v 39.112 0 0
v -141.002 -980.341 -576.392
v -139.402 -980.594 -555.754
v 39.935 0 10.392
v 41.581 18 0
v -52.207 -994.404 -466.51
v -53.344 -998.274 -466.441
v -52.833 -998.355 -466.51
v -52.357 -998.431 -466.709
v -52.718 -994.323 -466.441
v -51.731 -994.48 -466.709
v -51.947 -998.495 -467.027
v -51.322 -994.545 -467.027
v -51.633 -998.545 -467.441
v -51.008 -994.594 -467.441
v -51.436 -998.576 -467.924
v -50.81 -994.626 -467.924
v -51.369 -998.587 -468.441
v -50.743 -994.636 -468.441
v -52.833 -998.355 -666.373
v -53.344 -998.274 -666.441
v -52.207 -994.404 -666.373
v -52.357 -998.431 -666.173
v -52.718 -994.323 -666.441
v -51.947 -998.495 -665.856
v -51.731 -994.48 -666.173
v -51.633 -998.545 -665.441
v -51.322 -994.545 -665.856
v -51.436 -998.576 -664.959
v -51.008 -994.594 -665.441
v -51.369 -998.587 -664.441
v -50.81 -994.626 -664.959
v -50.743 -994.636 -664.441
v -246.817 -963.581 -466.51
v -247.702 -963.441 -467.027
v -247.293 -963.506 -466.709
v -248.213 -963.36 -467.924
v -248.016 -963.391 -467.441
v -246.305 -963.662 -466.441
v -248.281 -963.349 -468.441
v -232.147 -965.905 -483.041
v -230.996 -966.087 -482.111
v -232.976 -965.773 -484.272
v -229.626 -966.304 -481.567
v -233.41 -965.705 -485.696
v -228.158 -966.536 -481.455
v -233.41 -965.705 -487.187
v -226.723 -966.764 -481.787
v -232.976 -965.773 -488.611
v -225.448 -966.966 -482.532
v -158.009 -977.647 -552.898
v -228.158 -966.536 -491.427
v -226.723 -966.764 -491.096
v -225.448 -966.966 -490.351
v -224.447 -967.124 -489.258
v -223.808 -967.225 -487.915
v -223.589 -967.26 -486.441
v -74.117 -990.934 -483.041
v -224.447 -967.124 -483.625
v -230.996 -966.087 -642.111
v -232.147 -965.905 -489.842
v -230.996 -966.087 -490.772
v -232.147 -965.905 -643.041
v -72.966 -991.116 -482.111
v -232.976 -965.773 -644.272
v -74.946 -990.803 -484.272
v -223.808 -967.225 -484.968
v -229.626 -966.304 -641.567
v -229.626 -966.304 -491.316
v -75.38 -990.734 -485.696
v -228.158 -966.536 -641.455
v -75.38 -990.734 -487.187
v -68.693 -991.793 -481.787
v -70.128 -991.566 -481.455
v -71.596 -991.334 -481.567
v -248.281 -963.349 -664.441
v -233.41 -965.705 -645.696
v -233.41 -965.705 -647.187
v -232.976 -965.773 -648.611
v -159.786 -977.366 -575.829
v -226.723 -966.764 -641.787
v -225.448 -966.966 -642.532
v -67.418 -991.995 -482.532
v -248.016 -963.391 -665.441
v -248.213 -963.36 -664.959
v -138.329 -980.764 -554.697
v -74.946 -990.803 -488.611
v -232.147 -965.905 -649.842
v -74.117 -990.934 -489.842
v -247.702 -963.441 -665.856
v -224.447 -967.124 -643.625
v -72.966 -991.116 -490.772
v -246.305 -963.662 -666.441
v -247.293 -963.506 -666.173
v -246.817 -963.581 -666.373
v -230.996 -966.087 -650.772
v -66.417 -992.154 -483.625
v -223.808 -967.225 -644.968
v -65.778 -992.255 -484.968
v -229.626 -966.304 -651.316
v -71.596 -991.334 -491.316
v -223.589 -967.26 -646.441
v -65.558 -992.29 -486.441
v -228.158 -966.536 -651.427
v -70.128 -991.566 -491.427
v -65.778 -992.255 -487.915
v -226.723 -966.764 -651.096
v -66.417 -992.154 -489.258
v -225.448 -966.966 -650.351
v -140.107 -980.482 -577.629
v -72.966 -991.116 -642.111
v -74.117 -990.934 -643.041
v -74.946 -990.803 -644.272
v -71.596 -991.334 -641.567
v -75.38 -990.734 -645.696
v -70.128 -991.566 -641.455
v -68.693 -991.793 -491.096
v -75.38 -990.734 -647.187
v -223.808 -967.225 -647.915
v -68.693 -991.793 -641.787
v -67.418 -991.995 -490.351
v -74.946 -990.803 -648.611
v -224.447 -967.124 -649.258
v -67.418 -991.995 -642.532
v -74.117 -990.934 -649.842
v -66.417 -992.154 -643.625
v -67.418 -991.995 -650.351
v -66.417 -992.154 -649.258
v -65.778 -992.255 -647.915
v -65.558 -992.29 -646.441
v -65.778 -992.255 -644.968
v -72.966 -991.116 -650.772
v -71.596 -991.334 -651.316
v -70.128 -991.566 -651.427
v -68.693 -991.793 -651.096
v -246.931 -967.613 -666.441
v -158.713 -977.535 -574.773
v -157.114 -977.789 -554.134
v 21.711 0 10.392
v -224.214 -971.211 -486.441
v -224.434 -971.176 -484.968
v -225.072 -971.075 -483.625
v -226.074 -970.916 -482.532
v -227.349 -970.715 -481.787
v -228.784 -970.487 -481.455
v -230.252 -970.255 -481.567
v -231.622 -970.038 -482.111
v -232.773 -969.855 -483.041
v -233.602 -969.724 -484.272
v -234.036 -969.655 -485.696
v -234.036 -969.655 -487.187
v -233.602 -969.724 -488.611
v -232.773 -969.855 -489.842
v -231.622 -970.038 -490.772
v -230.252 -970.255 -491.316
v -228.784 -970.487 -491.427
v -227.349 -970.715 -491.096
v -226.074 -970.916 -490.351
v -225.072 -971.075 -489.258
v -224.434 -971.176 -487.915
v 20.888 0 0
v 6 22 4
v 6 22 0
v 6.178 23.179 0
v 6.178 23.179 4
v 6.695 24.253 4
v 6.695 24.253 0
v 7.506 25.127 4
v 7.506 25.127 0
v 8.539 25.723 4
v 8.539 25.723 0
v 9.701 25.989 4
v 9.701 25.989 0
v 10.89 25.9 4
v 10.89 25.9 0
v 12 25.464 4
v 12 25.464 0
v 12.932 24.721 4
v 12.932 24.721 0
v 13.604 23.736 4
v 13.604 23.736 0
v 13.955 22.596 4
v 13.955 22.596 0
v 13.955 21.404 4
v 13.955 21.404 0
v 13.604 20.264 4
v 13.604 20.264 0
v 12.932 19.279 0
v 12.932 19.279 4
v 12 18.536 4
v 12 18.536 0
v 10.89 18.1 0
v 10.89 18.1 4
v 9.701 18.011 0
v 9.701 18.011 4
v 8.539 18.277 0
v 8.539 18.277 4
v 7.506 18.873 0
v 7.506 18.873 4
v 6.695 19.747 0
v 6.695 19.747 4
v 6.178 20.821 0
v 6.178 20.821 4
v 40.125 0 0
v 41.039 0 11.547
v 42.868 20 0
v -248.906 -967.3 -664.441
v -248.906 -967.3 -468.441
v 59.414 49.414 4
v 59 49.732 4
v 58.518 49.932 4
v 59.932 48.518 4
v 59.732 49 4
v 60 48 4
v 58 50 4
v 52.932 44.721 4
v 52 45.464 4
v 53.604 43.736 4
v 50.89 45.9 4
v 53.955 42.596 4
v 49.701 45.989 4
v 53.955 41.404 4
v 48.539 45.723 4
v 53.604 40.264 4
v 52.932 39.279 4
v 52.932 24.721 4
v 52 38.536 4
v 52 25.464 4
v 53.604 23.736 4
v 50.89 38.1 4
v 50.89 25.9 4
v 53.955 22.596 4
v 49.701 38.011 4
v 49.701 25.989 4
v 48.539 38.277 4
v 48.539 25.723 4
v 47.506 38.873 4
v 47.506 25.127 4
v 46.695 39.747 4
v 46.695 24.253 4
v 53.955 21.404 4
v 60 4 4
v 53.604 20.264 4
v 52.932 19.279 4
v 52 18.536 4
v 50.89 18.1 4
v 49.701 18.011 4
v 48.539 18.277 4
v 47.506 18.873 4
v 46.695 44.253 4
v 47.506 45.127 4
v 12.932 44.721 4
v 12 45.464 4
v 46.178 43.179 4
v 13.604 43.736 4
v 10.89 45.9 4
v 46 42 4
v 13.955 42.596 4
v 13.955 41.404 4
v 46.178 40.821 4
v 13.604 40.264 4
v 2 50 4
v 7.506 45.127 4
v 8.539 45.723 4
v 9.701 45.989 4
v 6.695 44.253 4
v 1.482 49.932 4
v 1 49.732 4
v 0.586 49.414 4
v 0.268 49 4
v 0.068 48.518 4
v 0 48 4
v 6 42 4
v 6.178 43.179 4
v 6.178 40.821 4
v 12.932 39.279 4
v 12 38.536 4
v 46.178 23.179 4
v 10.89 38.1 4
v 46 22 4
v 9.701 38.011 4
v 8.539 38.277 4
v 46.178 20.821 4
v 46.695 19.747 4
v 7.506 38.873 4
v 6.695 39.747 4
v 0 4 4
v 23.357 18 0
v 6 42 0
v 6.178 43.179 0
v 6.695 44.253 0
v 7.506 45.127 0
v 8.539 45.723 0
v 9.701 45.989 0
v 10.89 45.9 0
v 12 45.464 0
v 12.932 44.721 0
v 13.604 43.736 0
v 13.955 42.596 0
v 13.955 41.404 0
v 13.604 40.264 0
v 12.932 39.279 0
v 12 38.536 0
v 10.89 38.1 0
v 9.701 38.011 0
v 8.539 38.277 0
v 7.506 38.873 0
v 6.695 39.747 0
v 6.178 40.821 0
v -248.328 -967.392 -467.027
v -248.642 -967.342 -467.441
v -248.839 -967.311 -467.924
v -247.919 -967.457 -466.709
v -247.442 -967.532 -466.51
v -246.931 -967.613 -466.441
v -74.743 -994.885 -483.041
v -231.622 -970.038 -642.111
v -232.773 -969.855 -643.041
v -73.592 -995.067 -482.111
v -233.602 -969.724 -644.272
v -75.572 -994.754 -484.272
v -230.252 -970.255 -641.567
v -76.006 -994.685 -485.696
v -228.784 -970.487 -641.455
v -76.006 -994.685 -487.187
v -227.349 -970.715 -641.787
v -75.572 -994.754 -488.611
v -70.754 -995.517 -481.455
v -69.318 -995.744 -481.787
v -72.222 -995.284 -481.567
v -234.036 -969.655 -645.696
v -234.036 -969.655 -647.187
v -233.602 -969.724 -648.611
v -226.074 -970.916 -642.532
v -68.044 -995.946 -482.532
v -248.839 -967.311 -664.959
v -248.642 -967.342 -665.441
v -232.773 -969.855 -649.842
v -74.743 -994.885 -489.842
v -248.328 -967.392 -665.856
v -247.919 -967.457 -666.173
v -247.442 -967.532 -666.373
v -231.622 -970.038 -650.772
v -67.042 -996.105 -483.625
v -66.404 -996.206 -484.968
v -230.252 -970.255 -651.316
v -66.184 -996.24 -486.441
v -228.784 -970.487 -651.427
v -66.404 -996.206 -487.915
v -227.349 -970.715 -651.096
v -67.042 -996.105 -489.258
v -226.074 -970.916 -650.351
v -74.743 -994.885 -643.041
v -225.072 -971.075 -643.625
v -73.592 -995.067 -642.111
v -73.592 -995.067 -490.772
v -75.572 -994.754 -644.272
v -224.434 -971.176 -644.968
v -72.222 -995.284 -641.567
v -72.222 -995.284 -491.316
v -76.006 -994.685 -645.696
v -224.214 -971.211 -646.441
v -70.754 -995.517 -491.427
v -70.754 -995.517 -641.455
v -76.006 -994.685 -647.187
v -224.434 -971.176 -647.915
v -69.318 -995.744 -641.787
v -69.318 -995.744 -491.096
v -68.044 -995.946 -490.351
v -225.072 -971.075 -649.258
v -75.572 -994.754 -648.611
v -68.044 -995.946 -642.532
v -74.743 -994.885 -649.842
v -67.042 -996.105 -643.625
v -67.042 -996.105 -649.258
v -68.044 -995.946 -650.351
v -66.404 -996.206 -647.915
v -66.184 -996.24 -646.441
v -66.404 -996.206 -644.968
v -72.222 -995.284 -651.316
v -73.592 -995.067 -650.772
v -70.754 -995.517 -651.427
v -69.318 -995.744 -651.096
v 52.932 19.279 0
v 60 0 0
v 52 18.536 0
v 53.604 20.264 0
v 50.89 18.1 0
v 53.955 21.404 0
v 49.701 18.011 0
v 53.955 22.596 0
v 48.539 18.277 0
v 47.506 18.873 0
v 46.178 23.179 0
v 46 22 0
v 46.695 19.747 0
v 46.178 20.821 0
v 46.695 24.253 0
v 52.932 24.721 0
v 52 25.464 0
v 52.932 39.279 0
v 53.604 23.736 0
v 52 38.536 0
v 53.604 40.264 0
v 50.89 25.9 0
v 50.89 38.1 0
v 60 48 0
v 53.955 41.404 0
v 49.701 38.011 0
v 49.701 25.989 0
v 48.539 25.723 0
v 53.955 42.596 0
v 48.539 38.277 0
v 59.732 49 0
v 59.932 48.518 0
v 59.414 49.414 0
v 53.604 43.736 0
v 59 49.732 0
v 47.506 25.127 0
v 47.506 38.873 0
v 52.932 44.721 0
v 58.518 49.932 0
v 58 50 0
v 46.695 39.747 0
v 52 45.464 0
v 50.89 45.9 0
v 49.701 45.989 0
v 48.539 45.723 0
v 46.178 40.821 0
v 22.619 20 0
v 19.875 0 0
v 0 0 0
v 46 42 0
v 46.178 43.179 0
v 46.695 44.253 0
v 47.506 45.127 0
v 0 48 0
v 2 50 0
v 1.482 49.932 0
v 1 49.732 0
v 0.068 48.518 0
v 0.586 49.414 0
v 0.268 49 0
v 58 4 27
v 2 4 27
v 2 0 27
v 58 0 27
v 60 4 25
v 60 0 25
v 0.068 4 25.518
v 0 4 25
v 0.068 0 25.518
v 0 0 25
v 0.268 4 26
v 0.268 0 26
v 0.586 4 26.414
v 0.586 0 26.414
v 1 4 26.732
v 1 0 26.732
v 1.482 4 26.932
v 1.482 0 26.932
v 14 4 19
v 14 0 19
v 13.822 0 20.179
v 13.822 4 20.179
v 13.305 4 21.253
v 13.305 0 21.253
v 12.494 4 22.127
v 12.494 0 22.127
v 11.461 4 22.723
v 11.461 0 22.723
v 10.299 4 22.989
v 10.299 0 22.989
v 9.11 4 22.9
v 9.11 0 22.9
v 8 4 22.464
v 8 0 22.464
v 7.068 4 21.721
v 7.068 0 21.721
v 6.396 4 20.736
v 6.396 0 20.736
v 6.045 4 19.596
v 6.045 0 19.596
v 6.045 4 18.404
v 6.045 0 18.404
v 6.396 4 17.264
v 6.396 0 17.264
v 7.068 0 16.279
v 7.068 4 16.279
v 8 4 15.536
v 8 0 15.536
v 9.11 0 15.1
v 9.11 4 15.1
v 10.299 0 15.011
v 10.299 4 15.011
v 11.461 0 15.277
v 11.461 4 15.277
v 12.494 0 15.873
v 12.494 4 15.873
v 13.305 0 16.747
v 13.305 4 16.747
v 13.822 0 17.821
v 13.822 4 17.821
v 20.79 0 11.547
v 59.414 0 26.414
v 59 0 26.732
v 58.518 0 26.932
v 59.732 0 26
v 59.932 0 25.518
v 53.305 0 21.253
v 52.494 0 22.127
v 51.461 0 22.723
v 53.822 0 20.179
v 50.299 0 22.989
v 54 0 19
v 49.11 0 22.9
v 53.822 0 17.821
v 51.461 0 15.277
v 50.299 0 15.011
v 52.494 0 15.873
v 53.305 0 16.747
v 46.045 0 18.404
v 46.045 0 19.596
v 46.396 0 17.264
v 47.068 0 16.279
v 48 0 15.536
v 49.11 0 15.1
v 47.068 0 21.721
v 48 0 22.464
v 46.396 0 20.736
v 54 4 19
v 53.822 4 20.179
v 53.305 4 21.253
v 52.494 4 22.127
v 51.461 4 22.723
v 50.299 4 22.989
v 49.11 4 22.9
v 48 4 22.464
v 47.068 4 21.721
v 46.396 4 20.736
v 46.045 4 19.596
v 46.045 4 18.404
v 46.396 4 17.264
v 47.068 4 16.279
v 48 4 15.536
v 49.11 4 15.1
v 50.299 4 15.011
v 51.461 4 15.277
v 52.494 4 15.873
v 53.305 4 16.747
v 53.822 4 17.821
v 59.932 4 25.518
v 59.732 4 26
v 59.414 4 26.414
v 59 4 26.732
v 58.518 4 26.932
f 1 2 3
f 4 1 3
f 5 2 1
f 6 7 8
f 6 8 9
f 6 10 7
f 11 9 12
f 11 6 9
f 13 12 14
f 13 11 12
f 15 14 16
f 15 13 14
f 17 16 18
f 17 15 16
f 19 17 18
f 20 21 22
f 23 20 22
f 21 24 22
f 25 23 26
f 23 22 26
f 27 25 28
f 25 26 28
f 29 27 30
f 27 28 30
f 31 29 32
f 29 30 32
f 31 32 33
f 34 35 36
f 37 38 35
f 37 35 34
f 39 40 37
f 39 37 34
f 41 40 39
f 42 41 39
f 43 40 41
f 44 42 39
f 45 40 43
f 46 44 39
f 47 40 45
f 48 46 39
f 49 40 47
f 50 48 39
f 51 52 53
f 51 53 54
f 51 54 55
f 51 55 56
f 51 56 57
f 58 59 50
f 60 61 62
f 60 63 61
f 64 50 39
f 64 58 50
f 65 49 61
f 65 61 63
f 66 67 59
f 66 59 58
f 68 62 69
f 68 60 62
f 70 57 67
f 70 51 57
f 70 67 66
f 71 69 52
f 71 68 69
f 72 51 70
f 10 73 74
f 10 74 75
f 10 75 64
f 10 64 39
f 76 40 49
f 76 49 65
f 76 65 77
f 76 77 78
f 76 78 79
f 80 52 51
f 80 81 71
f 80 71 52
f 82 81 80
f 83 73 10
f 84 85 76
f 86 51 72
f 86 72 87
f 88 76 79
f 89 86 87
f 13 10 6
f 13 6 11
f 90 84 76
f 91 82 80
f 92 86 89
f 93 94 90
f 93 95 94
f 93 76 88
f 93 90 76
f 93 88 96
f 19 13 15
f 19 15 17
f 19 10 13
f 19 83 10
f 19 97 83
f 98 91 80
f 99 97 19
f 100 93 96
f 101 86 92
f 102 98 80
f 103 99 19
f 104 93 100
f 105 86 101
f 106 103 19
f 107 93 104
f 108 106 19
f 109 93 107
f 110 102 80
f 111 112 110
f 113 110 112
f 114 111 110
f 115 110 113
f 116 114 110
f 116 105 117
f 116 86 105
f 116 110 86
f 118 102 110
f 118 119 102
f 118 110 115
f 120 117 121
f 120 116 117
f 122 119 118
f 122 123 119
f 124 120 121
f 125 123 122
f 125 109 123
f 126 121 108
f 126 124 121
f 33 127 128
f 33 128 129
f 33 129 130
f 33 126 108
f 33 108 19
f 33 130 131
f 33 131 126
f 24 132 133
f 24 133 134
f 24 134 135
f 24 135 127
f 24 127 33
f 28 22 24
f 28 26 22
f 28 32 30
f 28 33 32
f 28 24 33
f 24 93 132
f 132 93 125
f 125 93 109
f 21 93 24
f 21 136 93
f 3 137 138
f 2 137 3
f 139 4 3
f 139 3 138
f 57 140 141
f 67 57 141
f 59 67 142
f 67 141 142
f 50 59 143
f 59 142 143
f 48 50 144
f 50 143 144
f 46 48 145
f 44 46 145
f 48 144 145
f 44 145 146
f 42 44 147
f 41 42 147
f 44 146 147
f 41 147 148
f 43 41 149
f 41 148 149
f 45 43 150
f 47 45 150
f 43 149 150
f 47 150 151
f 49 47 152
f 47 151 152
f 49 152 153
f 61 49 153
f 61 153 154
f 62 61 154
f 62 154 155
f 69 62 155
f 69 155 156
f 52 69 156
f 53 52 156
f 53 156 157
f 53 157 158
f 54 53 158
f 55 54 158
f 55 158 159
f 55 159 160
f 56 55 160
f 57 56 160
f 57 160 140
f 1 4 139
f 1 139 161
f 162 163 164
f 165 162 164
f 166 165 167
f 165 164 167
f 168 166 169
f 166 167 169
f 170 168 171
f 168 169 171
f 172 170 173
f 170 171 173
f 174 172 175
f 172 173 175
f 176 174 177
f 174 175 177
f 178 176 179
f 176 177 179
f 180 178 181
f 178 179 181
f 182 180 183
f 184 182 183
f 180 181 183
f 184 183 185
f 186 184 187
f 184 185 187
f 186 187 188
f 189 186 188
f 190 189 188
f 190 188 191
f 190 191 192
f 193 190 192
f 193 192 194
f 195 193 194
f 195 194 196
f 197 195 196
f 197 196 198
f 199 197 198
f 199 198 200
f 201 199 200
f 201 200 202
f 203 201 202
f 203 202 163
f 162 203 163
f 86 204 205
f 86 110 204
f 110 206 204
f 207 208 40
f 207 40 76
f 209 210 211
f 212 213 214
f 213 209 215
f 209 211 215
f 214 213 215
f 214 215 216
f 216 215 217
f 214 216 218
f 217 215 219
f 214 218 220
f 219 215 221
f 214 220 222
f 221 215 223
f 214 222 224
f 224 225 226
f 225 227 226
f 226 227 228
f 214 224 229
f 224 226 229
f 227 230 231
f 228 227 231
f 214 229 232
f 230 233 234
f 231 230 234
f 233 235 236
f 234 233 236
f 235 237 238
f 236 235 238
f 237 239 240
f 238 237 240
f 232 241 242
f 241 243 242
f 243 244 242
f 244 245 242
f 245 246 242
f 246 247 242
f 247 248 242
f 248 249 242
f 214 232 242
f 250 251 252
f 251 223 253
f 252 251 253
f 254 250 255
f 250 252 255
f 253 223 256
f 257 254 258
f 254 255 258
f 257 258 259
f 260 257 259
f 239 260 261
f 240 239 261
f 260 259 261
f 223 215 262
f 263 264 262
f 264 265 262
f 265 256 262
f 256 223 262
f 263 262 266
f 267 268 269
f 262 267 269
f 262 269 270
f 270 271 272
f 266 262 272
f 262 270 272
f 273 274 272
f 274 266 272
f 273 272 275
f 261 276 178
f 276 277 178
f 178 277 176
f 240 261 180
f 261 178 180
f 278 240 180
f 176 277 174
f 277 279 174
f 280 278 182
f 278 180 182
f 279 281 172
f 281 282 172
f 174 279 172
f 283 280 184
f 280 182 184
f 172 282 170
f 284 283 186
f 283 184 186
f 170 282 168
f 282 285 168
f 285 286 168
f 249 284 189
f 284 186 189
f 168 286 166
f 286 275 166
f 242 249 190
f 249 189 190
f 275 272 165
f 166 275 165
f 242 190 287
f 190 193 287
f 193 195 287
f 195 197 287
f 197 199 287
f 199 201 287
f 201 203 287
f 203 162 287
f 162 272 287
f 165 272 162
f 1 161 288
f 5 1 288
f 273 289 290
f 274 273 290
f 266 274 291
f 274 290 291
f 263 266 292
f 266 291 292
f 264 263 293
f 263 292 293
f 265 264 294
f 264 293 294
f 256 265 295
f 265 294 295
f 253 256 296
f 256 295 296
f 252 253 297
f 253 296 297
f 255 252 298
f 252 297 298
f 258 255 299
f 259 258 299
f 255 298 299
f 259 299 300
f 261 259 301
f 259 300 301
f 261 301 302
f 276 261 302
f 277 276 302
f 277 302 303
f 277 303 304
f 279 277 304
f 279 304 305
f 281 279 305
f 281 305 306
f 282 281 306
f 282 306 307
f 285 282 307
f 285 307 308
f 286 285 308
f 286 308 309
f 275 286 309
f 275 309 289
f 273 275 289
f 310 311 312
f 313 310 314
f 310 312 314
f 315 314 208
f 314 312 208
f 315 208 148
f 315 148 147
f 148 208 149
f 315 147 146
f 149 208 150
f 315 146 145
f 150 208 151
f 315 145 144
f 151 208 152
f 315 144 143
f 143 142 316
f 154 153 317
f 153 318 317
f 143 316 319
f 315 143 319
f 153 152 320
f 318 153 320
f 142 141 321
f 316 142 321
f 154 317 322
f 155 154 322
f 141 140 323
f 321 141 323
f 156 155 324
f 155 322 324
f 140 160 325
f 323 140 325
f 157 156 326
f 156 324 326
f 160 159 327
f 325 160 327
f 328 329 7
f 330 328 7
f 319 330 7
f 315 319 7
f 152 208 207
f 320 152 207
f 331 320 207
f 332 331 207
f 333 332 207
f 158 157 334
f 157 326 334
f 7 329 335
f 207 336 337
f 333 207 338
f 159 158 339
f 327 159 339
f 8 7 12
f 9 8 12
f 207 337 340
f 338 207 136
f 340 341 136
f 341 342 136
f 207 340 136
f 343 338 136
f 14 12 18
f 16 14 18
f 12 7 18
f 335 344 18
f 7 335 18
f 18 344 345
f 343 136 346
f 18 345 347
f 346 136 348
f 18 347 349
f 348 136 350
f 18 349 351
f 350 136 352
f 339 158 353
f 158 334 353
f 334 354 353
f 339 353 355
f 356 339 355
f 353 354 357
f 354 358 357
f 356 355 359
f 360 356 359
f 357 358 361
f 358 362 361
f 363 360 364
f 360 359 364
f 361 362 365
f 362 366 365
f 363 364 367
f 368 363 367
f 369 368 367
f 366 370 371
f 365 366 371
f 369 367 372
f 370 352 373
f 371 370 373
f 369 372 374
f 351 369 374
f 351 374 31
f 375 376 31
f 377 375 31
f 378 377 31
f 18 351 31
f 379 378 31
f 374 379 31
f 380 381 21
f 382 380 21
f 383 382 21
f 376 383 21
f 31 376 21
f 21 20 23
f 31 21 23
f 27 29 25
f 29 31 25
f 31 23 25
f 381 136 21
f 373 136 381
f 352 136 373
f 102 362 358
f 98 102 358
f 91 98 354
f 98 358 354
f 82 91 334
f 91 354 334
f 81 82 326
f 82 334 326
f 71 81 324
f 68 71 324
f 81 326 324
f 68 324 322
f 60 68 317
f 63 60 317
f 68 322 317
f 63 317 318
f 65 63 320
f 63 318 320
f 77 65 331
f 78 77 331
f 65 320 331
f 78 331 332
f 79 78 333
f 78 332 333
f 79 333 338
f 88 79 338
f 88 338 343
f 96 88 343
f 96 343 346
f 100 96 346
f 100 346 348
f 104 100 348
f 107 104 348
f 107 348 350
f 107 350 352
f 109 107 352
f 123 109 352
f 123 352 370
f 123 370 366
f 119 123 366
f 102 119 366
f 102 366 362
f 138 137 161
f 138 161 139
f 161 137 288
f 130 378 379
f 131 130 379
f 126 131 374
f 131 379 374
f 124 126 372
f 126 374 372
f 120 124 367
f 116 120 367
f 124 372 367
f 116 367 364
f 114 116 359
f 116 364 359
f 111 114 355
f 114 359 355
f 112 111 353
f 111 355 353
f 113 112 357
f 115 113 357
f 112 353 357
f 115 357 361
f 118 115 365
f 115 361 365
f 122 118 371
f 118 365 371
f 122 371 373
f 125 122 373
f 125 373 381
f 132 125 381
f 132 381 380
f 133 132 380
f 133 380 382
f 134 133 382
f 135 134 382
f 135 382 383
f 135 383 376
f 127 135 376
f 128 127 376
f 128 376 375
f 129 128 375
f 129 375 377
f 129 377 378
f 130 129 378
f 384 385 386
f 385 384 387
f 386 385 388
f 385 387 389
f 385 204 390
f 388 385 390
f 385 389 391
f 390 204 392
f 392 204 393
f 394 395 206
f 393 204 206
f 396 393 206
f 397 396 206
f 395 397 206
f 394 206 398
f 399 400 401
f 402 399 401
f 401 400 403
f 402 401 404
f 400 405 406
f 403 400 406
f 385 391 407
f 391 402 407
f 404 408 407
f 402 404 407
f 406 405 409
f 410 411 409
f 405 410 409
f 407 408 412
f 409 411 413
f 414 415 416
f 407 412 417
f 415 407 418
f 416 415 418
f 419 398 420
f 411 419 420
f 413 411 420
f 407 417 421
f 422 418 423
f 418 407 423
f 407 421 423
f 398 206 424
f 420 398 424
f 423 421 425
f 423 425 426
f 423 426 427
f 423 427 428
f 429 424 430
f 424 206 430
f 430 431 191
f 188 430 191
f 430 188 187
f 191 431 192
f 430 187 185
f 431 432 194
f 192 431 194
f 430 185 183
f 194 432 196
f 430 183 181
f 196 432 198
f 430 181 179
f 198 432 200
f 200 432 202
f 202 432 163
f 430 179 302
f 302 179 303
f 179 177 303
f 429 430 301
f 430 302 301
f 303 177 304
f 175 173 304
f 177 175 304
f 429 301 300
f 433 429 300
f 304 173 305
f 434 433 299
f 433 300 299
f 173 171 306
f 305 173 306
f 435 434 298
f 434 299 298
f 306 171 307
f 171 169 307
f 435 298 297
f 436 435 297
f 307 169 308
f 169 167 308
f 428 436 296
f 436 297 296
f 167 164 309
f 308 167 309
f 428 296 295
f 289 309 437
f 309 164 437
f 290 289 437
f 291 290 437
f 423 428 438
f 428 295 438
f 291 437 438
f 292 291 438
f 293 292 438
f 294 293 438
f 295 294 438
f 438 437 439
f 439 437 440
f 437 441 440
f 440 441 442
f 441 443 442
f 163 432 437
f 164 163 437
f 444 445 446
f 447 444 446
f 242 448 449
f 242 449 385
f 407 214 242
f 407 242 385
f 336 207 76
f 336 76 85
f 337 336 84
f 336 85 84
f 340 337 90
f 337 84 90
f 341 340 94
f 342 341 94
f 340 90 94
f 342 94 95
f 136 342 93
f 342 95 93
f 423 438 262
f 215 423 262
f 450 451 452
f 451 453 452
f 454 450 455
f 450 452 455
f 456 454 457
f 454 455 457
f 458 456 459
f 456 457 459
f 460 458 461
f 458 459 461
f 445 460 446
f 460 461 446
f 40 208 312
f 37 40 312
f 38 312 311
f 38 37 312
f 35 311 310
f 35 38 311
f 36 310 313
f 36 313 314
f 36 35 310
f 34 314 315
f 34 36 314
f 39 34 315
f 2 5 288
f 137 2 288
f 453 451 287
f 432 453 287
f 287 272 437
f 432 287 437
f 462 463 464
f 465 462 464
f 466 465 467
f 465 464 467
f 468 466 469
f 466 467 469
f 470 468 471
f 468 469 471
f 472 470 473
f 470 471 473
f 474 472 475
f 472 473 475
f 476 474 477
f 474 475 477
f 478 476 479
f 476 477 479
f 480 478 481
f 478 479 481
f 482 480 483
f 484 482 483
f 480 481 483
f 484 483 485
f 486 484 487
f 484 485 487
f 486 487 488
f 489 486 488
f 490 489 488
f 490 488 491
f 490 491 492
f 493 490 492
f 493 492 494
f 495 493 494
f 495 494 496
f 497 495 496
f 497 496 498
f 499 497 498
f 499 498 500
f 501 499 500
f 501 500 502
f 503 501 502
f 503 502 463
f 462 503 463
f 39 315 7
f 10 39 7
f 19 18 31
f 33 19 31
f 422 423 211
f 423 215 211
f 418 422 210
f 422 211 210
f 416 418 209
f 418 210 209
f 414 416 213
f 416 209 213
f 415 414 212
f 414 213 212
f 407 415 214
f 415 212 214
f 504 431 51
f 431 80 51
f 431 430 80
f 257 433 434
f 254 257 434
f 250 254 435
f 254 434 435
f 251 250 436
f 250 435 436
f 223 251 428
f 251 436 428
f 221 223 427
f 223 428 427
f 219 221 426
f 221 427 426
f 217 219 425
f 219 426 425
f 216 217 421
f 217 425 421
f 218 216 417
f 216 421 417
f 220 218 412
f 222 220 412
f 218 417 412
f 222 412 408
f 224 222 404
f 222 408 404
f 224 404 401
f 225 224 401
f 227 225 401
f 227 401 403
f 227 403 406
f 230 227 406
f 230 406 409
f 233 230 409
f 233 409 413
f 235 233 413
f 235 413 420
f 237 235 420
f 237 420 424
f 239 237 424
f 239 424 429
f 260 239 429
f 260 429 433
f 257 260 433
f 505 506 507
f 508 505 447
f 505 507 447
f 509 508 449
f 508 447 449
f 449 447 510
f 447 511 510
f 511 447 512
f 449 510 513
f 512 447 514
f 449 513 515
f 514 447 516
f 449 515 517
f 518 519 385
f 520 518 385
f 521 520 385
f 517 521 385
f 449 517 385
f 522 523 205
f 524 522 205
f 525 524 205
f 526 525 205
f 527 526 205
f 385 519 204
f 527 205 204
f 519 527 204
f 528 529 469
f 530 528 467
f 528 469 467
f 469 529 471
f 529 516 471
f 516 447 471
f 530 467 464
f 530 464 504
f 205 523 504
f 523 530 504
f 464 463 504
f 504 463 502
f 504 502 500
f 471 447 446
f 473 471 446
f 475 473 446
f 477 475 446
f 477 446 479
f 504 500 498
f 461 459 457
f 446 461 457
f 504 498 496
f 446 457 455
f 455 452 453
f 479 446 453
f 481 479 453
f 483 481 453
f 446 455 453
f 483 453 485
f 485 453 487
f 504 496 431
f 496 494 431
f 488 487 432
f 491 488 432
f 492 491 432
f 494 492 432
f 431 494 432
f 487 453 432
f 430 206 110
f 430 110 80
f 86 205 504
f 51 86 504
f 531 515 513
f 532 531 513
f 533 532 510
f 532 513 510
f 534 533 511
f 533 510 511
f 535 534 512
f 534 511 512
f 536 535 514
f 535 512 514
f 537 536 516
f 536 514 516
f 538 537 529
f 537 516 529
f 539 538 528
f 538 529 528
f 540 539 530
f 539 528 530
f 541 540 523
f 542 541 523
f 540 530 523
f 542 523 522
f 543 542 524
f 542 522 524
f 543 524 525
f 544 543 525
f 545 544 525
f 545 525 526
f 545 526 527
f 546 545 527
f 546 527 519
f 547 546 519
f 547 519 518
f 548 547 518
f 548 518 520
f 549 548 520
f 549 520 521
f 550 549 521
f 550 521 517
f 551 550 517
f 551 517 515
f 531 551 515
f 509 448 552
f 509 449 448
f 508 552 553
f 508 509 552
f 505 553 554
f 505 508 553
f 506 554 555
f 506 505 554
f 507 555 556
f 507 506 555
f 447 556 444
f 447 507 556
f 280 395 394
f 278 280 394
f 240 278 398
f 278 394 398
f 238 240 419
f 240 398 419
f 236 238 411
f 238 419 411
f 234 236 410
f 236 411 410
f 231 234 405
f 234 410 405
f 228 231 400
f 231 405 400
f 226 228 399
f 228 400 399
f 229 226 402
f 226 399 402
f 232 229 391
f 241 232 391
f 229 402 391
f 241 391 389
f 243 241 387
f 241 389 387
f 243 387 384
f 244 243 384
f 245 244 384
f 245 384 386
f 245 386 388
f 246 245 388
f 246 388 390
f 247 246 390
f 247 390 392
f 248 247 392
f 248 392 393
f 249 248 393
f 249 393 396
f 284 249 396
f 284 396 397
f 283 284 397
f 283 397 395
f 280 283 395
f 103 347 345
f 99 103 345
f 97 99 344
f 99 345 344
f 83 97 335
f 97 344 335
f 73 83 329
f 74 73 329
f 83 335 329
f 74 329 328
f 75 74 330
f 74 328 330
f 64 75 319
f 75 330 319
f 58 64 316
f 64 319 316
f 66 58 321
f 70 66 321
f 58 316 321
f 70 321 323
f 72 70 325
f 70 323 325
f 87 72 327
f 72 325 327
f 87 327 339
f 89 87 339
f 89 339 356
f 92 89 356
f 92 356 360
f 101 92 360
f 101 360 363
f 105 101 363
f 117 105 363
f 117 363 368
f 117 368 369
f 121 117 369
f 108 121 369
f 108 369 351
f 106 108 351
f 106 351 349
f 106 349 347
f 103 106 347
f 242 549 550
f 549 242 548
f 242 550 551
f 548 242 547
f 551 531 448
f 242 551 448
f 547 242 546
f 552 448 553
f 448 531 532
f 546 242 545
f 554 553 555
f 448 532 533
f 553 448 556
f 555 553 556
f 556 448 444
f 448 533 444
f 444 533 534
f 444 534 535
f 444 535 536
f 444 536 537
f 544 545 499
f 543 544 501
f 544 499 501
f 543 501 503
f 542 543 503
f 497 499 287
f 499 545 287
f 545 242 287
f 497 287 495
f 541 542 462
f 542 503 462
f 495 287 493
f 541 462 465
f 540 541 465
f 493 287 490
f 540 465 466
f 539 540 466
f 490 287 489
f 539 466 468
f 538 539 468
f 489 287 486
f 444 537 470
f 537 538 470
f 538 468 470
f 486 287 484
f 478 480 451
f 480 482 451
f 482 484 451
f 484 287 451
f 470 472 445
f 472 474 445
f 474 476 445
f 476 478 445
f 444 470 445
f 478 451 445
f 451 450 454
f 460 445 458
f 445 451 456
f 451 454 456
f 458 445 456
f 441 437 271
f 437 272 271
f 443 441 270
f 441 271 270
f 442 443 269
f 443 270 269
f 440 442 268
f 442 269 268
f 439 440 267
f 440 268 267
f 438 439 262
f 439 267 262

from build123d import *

# Parameters (mm, degrees)
BOSS_EXTRUDE1_DEPTH      = 60
SKETCH3_W                = 20
SKETCH3_H                = 20
SKETCH3_W_2              = 18
SKETCH3_H_2              = 18
BOSS_EXTRUDE2_DEPTH      = 2000
BOSS_EXTRUDE2_DEPTH_BACK = 20
CUT_EXTRUDE1_DEPTH       = 60
SKETCH7_W                = 200
SKETCH7_H                = 200
BOSS_EXTRUDE3_DEPTH      = 4
SKETCH8_W                = 109.20231627
SKETCH8_H                = 482.966945154
CUT_EXTRUDE3_DEPTH       = 1000
CUT_EXTRUDE4_REACH       = 29
SKETCH9_R                = 3.999999996
CUT_EXTRUDE5_REACH       = 52
SKETCH10_R               = 4.000000003
CUT_EXTRUDE6_REACH       = 1055.099
SKETCH11_R               = 5
FILLET1_R                = 2
FILLET2_R                = 2


with BuildPart() as part:
    # Sketch1 → Boss-Extrude1 (new body)
    with BuildSketch(Plane(origin=(0, 0, 0), x_dir=(0, 0, -1), z_dir=(1, 0, 0))):
        Polygon((0, 0), (0, 50), (-4, 50), (-4, 4), (-27, 4), (-27, 0), align=None)
    extrude(amount=BOSS_EXTRUDE1_DEPTH)

    # Sketch3 → Boss-Extrude2 (add, two sides)
    with BuildSketch(Plane(origin=(0.734152256, 4.01424851, 2.317627458), x_dir=(0, -0.5, 0.866025404), z_dir=(-0.156434465, -0.855363194, -0.49384417))) as boss_extrude2_sk:
        with Locations((0, -29.630650218)):
            Rectangle(SKETCH3_W, SKETCH3_H)
        with Locations((0, -29.630650218)):
            Rectangle(SKETCH3_W_2, SKETCH3_H_2, mode=Mode.SUBTRACT)
    extrude(amount=BOSS_EXTRUDE2_DEPTH)
    extrude(boss_extrude2_sk.sketch, amount=-BOSS_EXTRUDE2_DEPTH_BACK)

    # Sketch5 → Cut-Extrude1 (cut)
    with BuildSketch(Plane.ZY):
        Polygon((4, 4), (4, 36.054903459), (38.781358344, 4), align=None)
    extrude(amount=-CUT_EXTRUDE1_DEPTH, mode=Mode.SUBTRACT)

    # Sketch7 → Boss-Extrude3 (add)
    with BuildSketch(Plane(origin=(-155.547262091, -982.086761679, 2e-09), x_dir=(0.987688341, -0.156434465, 0), z_dir=(0.156434465, 0.987688341, 0))):
        with Locations((5.477031178, 566.441418592)):
            Rectangle(SKETCH7_W, SKETCH7_H)
    extrude(amount=BOSS_EXTRUDE3_DEPTH)

    # Sketch8 → Cut-Extrude3 (cut)
    with BuildSketch(Plane(origin=(-155.547262091, -982.086761679, 2e-09), x_dir=(0.987688341, -0.156434465, 0), z_dir=(-0.156434465, -0.987688341, 0))):
        with Locations((4.33544583, -787.065663544)):
            Rectangle(SKETCH8_W, SKETCH8_H)
    extrude(amount=CUT_EXTRUDE3_DEPTH, mode=Mode.SUBTRACT)

    # Sketch9 → Cut-Extrude4 (cut, up to next)
    with BuildSketch(Plane(origin=(0, 0, 0), x_dir=(-1, 0, 0), z_dir=(0, 0, -1)), mode=Mode.PRIVATE) as cut_extrude4_sk1:
        with Locations((-50, 22)):
            Circle(SKETCH9_R)
    cut_extrude4_tool1 = extrude(cut_extrude4_sk1.sketch, amount=-CUT_EXTRUDE4_REACH, mode=Mode.PRIVATE) & part.part
    add(cut_extrude4_tool1.solids().sort_by_distance((50, 22, 0))[0], mode=Mode.SUBTRACT)
    # Sketch9 → Cut-Extrude4 (cut, up to next)
    with BuildSketch(Plane(origin=(0, 0, 0), x_dir=(-1, 0, 0), z_dir=(0, 0, -1)), mode=Mode.PRIVATE) as cut_extrude4_sk2:
        with Locations((-10, 22)):
            Circle(SKETCH9_R)
    cut_extrude4_tool2 = extrude(cut_extrude4_sk2.sketch, amount=-CUT_EXTRUDE4_REACH, mode=Mode.PRIVATE) & part.part
    add(cut_extrude4_tool2.solids().sort_by_distance((10, 22, 0))[0], mode=Mode.SUBTRACT)
    # Sketch9 → Cut-Extrude4 (cut, up to next)
    with BuildSketch(Plane(origin=(0, 0, 0), x_dir=(-1, 0, 0), z_dir=(0, 0, -1)), mode=Mode.PRIVATE) as cut_extrude4_sk3:
        with Locations((-10, 42)):
            Circle(SKETCH9_R)
    cut_extrude4_tool3 = extrude(cut_extrude4_sk3.sketch, amount=-CUT_EXTRUDE4_REACH, mode=Mode.PRIVATE) & part.part
    add(cut_extrude4_tool3.solids().sort_by_distance((10, 42, 0))[0], mode=Mode.SUBTRACT)
    # Sketch9 → Cut-Extrude4 (cut, up to next)
    with BuildSketch(Plane(origin=(0, 0, 0), x_dir=(-1, 0, 0), z_dir=(0, 0, -1)), mode=Mode.PRIVATE) as cut_extrude4_sk4:
        with Locations((-50, 42)):
            Circle(SKETCH9_R)
    cut_extrude4_tool4 = extrude(cut_extrude4_sk4.sketch, amount=-CUT_EXTRUDE4_REACH, mode=Mode.PRIVATE) & part.part
    add(cut_extrude4_tool4.solids().sort_by_distance((50, 42, 0))[0], mode=Mode.SUBTRACT)

    # Sketch10 → Cut-Extrude5 (cut, up to next)
    with BuildSketch(Plane.XZ, mode=Mode.PRIVATE) as cut_extrude5_sk1:
        with Locations((50, 19)):
            Circle(SKETCH10_R)
    cut_extrude5_tool1 = extrude(cut_extrude5_sk1.sketch, amount=-CUT_EXTRUDE5_REACH, mode=Mode.PRIVATE) & part.part
    add(cut_extrude5_tool1.solids().sort_by_distance((50, 0, 19))[0], mode=Mode.SUBTRACT)
    # Sketch10 → Cut-Extrude5 (cut, up to next)
    with BuildSketch(Plane.XZ, mode=Mode.PRIVATE) as cut_extrude5_sk2:
        with Locations((10, 19)):
            Circle(SKETCH10_R)
    cut_extrude5_tool2 = extrude(cut_extrude5_sk2.sketch, amount=-CUT_EXTRUDE5_REACH, mode=Mode.PRIVATE) & part.part
    add(cut_extrude5_tool2.solids().sort_by_distance((10, 0, 19))[0], mode=Mode.SUBTRACT)

    # Sketch11 → Cut-Extrude6 (cut, up to next)
    with BuildSketch(Plane(origin=(-155.547262091, -982.086761679, 2e-09), x_dir=(0.987688341, -0.156434465, 0), z_dir=(-0.156434465, -0.987688341, 0)), mode=Mode.PRIVATE) as cut_extrude6_sk1:
        with Locations((-74.522968646, -486.441418617)):
            Circle(SKETCH11_R)
    cut_extrude6_tool1 = extrude(cut_extrude6_sk1.sketch, amount=-CUT_EXTRUDE6_REACH, mode=Mode.PRIVATE) & part.part
    add(cut_extrude6_tool1.solids().sort_by_distance((-229.152729, -970.428801, -486.441419))[0], mode=Mode.SUBTRACT)
    # Sketch11 → Cut-Extrude6 (cut, up to next)
    with BuildSketch(Plane(origin=(-155.547262091, -982.086761679, 2e-09), x_dir=(0.987688341, -0.156434465, 0), z_dir=(-0.156434465, -0.987688341, 0)), mode=Mode.PRIVATE) as cut_extrude6_sk2:
        with Locations((85.477031354, -486.441418617)):
            Circle(SKETCH11_R)
    cut_extrude6_tool2 = extrude(cut_extrude6_sk2.sketch, amount=-CUT_EXTRUDE6_REACH, mode=Mode.PRIVATE) & part.part
    add(cut_extrude6_tool2.solids().sort_by_distance((-71.122595, -995.458315, -486.441419))[0], mode=Mode.SUBTRACT)
    # Sketch11 → Cut-Extrude6 (cut, up to next)
    with BuildSketch(Plane(origin=(-155.547262091, -982.086761679, 2e-09), x_dir=(0.987688341, -0.156434465, 0), z_dir=(-0.156434465, -0.987688341, 0)), mode=Mode.PRIVATE) as cut_extrude6_sk3:
        with Locations((85.477031354, -646.441418617)):
            Circle(SKETCH11_R)
    cut_extrude6_tool3 = extrude(cut_extrude6_sk3.sketch, amount=-CUT_EXTRUDE6_REACH, mode=Mode.PRIVATE) & part.part
    add(cut_extrude6_tool3.solids().sort_by_distance((-71.122595, -995.458315, -646.441419))[0], mode=Mode.SUBTRACT)
    # Sketch11 → Cut-Extrude6 (cut, up to next)
    with BuildSketch(Plane(origin=(-155.547262091, -982.086761679, 2e-09), x_dir=(0.987688341, -0.156434465, 0), z_dir=(-0.156434465, -0.987688341, 0)), mode=Mode.PRIVATE) as cut_extrude6_sk4:
        with Locations((-74.522968646, -646.441418617)):
            Circle(SKETCH11_R)
    cut_extrude6_tool4 = extrude(cut_extrude6_sk4.sketch, amount=-CUT_EXTRUDE6_REACH, mode=Mode.PRIVATE) & part.part
    add(cut_extrude6_tool4.solids().sort_by_distance((-229.152729, -970.428801, -646.441419))[0], mode=Mode.SUBTRACT)

    # Fillet1
    fillet1_edges = [part.edges().sort_by_distance(p)[0] for p in [
        (60, 50, 2),
        (60, 2, 27),
        (0, 2, 27),
        (0, 50, 2),
    ]]
    fillet(fillet1_edges, radius=FILLET1_R)

    # Fillet2
    fillet2_edges = [part.edges().sort_by_distance(p)[0] for p in [
        (-248.593627385, -965.324734939, -666.44141859),
        (-248.593627385, -965.324734938, -466.44141859),
        (-51.055959266, -996.611627945, -466.44141859),
        (-51.055959266, -996.611627945, -666.44141859),
    ]]
    fillet(fillet2_edges, radius=FILLET2_R)


solid = part.part
